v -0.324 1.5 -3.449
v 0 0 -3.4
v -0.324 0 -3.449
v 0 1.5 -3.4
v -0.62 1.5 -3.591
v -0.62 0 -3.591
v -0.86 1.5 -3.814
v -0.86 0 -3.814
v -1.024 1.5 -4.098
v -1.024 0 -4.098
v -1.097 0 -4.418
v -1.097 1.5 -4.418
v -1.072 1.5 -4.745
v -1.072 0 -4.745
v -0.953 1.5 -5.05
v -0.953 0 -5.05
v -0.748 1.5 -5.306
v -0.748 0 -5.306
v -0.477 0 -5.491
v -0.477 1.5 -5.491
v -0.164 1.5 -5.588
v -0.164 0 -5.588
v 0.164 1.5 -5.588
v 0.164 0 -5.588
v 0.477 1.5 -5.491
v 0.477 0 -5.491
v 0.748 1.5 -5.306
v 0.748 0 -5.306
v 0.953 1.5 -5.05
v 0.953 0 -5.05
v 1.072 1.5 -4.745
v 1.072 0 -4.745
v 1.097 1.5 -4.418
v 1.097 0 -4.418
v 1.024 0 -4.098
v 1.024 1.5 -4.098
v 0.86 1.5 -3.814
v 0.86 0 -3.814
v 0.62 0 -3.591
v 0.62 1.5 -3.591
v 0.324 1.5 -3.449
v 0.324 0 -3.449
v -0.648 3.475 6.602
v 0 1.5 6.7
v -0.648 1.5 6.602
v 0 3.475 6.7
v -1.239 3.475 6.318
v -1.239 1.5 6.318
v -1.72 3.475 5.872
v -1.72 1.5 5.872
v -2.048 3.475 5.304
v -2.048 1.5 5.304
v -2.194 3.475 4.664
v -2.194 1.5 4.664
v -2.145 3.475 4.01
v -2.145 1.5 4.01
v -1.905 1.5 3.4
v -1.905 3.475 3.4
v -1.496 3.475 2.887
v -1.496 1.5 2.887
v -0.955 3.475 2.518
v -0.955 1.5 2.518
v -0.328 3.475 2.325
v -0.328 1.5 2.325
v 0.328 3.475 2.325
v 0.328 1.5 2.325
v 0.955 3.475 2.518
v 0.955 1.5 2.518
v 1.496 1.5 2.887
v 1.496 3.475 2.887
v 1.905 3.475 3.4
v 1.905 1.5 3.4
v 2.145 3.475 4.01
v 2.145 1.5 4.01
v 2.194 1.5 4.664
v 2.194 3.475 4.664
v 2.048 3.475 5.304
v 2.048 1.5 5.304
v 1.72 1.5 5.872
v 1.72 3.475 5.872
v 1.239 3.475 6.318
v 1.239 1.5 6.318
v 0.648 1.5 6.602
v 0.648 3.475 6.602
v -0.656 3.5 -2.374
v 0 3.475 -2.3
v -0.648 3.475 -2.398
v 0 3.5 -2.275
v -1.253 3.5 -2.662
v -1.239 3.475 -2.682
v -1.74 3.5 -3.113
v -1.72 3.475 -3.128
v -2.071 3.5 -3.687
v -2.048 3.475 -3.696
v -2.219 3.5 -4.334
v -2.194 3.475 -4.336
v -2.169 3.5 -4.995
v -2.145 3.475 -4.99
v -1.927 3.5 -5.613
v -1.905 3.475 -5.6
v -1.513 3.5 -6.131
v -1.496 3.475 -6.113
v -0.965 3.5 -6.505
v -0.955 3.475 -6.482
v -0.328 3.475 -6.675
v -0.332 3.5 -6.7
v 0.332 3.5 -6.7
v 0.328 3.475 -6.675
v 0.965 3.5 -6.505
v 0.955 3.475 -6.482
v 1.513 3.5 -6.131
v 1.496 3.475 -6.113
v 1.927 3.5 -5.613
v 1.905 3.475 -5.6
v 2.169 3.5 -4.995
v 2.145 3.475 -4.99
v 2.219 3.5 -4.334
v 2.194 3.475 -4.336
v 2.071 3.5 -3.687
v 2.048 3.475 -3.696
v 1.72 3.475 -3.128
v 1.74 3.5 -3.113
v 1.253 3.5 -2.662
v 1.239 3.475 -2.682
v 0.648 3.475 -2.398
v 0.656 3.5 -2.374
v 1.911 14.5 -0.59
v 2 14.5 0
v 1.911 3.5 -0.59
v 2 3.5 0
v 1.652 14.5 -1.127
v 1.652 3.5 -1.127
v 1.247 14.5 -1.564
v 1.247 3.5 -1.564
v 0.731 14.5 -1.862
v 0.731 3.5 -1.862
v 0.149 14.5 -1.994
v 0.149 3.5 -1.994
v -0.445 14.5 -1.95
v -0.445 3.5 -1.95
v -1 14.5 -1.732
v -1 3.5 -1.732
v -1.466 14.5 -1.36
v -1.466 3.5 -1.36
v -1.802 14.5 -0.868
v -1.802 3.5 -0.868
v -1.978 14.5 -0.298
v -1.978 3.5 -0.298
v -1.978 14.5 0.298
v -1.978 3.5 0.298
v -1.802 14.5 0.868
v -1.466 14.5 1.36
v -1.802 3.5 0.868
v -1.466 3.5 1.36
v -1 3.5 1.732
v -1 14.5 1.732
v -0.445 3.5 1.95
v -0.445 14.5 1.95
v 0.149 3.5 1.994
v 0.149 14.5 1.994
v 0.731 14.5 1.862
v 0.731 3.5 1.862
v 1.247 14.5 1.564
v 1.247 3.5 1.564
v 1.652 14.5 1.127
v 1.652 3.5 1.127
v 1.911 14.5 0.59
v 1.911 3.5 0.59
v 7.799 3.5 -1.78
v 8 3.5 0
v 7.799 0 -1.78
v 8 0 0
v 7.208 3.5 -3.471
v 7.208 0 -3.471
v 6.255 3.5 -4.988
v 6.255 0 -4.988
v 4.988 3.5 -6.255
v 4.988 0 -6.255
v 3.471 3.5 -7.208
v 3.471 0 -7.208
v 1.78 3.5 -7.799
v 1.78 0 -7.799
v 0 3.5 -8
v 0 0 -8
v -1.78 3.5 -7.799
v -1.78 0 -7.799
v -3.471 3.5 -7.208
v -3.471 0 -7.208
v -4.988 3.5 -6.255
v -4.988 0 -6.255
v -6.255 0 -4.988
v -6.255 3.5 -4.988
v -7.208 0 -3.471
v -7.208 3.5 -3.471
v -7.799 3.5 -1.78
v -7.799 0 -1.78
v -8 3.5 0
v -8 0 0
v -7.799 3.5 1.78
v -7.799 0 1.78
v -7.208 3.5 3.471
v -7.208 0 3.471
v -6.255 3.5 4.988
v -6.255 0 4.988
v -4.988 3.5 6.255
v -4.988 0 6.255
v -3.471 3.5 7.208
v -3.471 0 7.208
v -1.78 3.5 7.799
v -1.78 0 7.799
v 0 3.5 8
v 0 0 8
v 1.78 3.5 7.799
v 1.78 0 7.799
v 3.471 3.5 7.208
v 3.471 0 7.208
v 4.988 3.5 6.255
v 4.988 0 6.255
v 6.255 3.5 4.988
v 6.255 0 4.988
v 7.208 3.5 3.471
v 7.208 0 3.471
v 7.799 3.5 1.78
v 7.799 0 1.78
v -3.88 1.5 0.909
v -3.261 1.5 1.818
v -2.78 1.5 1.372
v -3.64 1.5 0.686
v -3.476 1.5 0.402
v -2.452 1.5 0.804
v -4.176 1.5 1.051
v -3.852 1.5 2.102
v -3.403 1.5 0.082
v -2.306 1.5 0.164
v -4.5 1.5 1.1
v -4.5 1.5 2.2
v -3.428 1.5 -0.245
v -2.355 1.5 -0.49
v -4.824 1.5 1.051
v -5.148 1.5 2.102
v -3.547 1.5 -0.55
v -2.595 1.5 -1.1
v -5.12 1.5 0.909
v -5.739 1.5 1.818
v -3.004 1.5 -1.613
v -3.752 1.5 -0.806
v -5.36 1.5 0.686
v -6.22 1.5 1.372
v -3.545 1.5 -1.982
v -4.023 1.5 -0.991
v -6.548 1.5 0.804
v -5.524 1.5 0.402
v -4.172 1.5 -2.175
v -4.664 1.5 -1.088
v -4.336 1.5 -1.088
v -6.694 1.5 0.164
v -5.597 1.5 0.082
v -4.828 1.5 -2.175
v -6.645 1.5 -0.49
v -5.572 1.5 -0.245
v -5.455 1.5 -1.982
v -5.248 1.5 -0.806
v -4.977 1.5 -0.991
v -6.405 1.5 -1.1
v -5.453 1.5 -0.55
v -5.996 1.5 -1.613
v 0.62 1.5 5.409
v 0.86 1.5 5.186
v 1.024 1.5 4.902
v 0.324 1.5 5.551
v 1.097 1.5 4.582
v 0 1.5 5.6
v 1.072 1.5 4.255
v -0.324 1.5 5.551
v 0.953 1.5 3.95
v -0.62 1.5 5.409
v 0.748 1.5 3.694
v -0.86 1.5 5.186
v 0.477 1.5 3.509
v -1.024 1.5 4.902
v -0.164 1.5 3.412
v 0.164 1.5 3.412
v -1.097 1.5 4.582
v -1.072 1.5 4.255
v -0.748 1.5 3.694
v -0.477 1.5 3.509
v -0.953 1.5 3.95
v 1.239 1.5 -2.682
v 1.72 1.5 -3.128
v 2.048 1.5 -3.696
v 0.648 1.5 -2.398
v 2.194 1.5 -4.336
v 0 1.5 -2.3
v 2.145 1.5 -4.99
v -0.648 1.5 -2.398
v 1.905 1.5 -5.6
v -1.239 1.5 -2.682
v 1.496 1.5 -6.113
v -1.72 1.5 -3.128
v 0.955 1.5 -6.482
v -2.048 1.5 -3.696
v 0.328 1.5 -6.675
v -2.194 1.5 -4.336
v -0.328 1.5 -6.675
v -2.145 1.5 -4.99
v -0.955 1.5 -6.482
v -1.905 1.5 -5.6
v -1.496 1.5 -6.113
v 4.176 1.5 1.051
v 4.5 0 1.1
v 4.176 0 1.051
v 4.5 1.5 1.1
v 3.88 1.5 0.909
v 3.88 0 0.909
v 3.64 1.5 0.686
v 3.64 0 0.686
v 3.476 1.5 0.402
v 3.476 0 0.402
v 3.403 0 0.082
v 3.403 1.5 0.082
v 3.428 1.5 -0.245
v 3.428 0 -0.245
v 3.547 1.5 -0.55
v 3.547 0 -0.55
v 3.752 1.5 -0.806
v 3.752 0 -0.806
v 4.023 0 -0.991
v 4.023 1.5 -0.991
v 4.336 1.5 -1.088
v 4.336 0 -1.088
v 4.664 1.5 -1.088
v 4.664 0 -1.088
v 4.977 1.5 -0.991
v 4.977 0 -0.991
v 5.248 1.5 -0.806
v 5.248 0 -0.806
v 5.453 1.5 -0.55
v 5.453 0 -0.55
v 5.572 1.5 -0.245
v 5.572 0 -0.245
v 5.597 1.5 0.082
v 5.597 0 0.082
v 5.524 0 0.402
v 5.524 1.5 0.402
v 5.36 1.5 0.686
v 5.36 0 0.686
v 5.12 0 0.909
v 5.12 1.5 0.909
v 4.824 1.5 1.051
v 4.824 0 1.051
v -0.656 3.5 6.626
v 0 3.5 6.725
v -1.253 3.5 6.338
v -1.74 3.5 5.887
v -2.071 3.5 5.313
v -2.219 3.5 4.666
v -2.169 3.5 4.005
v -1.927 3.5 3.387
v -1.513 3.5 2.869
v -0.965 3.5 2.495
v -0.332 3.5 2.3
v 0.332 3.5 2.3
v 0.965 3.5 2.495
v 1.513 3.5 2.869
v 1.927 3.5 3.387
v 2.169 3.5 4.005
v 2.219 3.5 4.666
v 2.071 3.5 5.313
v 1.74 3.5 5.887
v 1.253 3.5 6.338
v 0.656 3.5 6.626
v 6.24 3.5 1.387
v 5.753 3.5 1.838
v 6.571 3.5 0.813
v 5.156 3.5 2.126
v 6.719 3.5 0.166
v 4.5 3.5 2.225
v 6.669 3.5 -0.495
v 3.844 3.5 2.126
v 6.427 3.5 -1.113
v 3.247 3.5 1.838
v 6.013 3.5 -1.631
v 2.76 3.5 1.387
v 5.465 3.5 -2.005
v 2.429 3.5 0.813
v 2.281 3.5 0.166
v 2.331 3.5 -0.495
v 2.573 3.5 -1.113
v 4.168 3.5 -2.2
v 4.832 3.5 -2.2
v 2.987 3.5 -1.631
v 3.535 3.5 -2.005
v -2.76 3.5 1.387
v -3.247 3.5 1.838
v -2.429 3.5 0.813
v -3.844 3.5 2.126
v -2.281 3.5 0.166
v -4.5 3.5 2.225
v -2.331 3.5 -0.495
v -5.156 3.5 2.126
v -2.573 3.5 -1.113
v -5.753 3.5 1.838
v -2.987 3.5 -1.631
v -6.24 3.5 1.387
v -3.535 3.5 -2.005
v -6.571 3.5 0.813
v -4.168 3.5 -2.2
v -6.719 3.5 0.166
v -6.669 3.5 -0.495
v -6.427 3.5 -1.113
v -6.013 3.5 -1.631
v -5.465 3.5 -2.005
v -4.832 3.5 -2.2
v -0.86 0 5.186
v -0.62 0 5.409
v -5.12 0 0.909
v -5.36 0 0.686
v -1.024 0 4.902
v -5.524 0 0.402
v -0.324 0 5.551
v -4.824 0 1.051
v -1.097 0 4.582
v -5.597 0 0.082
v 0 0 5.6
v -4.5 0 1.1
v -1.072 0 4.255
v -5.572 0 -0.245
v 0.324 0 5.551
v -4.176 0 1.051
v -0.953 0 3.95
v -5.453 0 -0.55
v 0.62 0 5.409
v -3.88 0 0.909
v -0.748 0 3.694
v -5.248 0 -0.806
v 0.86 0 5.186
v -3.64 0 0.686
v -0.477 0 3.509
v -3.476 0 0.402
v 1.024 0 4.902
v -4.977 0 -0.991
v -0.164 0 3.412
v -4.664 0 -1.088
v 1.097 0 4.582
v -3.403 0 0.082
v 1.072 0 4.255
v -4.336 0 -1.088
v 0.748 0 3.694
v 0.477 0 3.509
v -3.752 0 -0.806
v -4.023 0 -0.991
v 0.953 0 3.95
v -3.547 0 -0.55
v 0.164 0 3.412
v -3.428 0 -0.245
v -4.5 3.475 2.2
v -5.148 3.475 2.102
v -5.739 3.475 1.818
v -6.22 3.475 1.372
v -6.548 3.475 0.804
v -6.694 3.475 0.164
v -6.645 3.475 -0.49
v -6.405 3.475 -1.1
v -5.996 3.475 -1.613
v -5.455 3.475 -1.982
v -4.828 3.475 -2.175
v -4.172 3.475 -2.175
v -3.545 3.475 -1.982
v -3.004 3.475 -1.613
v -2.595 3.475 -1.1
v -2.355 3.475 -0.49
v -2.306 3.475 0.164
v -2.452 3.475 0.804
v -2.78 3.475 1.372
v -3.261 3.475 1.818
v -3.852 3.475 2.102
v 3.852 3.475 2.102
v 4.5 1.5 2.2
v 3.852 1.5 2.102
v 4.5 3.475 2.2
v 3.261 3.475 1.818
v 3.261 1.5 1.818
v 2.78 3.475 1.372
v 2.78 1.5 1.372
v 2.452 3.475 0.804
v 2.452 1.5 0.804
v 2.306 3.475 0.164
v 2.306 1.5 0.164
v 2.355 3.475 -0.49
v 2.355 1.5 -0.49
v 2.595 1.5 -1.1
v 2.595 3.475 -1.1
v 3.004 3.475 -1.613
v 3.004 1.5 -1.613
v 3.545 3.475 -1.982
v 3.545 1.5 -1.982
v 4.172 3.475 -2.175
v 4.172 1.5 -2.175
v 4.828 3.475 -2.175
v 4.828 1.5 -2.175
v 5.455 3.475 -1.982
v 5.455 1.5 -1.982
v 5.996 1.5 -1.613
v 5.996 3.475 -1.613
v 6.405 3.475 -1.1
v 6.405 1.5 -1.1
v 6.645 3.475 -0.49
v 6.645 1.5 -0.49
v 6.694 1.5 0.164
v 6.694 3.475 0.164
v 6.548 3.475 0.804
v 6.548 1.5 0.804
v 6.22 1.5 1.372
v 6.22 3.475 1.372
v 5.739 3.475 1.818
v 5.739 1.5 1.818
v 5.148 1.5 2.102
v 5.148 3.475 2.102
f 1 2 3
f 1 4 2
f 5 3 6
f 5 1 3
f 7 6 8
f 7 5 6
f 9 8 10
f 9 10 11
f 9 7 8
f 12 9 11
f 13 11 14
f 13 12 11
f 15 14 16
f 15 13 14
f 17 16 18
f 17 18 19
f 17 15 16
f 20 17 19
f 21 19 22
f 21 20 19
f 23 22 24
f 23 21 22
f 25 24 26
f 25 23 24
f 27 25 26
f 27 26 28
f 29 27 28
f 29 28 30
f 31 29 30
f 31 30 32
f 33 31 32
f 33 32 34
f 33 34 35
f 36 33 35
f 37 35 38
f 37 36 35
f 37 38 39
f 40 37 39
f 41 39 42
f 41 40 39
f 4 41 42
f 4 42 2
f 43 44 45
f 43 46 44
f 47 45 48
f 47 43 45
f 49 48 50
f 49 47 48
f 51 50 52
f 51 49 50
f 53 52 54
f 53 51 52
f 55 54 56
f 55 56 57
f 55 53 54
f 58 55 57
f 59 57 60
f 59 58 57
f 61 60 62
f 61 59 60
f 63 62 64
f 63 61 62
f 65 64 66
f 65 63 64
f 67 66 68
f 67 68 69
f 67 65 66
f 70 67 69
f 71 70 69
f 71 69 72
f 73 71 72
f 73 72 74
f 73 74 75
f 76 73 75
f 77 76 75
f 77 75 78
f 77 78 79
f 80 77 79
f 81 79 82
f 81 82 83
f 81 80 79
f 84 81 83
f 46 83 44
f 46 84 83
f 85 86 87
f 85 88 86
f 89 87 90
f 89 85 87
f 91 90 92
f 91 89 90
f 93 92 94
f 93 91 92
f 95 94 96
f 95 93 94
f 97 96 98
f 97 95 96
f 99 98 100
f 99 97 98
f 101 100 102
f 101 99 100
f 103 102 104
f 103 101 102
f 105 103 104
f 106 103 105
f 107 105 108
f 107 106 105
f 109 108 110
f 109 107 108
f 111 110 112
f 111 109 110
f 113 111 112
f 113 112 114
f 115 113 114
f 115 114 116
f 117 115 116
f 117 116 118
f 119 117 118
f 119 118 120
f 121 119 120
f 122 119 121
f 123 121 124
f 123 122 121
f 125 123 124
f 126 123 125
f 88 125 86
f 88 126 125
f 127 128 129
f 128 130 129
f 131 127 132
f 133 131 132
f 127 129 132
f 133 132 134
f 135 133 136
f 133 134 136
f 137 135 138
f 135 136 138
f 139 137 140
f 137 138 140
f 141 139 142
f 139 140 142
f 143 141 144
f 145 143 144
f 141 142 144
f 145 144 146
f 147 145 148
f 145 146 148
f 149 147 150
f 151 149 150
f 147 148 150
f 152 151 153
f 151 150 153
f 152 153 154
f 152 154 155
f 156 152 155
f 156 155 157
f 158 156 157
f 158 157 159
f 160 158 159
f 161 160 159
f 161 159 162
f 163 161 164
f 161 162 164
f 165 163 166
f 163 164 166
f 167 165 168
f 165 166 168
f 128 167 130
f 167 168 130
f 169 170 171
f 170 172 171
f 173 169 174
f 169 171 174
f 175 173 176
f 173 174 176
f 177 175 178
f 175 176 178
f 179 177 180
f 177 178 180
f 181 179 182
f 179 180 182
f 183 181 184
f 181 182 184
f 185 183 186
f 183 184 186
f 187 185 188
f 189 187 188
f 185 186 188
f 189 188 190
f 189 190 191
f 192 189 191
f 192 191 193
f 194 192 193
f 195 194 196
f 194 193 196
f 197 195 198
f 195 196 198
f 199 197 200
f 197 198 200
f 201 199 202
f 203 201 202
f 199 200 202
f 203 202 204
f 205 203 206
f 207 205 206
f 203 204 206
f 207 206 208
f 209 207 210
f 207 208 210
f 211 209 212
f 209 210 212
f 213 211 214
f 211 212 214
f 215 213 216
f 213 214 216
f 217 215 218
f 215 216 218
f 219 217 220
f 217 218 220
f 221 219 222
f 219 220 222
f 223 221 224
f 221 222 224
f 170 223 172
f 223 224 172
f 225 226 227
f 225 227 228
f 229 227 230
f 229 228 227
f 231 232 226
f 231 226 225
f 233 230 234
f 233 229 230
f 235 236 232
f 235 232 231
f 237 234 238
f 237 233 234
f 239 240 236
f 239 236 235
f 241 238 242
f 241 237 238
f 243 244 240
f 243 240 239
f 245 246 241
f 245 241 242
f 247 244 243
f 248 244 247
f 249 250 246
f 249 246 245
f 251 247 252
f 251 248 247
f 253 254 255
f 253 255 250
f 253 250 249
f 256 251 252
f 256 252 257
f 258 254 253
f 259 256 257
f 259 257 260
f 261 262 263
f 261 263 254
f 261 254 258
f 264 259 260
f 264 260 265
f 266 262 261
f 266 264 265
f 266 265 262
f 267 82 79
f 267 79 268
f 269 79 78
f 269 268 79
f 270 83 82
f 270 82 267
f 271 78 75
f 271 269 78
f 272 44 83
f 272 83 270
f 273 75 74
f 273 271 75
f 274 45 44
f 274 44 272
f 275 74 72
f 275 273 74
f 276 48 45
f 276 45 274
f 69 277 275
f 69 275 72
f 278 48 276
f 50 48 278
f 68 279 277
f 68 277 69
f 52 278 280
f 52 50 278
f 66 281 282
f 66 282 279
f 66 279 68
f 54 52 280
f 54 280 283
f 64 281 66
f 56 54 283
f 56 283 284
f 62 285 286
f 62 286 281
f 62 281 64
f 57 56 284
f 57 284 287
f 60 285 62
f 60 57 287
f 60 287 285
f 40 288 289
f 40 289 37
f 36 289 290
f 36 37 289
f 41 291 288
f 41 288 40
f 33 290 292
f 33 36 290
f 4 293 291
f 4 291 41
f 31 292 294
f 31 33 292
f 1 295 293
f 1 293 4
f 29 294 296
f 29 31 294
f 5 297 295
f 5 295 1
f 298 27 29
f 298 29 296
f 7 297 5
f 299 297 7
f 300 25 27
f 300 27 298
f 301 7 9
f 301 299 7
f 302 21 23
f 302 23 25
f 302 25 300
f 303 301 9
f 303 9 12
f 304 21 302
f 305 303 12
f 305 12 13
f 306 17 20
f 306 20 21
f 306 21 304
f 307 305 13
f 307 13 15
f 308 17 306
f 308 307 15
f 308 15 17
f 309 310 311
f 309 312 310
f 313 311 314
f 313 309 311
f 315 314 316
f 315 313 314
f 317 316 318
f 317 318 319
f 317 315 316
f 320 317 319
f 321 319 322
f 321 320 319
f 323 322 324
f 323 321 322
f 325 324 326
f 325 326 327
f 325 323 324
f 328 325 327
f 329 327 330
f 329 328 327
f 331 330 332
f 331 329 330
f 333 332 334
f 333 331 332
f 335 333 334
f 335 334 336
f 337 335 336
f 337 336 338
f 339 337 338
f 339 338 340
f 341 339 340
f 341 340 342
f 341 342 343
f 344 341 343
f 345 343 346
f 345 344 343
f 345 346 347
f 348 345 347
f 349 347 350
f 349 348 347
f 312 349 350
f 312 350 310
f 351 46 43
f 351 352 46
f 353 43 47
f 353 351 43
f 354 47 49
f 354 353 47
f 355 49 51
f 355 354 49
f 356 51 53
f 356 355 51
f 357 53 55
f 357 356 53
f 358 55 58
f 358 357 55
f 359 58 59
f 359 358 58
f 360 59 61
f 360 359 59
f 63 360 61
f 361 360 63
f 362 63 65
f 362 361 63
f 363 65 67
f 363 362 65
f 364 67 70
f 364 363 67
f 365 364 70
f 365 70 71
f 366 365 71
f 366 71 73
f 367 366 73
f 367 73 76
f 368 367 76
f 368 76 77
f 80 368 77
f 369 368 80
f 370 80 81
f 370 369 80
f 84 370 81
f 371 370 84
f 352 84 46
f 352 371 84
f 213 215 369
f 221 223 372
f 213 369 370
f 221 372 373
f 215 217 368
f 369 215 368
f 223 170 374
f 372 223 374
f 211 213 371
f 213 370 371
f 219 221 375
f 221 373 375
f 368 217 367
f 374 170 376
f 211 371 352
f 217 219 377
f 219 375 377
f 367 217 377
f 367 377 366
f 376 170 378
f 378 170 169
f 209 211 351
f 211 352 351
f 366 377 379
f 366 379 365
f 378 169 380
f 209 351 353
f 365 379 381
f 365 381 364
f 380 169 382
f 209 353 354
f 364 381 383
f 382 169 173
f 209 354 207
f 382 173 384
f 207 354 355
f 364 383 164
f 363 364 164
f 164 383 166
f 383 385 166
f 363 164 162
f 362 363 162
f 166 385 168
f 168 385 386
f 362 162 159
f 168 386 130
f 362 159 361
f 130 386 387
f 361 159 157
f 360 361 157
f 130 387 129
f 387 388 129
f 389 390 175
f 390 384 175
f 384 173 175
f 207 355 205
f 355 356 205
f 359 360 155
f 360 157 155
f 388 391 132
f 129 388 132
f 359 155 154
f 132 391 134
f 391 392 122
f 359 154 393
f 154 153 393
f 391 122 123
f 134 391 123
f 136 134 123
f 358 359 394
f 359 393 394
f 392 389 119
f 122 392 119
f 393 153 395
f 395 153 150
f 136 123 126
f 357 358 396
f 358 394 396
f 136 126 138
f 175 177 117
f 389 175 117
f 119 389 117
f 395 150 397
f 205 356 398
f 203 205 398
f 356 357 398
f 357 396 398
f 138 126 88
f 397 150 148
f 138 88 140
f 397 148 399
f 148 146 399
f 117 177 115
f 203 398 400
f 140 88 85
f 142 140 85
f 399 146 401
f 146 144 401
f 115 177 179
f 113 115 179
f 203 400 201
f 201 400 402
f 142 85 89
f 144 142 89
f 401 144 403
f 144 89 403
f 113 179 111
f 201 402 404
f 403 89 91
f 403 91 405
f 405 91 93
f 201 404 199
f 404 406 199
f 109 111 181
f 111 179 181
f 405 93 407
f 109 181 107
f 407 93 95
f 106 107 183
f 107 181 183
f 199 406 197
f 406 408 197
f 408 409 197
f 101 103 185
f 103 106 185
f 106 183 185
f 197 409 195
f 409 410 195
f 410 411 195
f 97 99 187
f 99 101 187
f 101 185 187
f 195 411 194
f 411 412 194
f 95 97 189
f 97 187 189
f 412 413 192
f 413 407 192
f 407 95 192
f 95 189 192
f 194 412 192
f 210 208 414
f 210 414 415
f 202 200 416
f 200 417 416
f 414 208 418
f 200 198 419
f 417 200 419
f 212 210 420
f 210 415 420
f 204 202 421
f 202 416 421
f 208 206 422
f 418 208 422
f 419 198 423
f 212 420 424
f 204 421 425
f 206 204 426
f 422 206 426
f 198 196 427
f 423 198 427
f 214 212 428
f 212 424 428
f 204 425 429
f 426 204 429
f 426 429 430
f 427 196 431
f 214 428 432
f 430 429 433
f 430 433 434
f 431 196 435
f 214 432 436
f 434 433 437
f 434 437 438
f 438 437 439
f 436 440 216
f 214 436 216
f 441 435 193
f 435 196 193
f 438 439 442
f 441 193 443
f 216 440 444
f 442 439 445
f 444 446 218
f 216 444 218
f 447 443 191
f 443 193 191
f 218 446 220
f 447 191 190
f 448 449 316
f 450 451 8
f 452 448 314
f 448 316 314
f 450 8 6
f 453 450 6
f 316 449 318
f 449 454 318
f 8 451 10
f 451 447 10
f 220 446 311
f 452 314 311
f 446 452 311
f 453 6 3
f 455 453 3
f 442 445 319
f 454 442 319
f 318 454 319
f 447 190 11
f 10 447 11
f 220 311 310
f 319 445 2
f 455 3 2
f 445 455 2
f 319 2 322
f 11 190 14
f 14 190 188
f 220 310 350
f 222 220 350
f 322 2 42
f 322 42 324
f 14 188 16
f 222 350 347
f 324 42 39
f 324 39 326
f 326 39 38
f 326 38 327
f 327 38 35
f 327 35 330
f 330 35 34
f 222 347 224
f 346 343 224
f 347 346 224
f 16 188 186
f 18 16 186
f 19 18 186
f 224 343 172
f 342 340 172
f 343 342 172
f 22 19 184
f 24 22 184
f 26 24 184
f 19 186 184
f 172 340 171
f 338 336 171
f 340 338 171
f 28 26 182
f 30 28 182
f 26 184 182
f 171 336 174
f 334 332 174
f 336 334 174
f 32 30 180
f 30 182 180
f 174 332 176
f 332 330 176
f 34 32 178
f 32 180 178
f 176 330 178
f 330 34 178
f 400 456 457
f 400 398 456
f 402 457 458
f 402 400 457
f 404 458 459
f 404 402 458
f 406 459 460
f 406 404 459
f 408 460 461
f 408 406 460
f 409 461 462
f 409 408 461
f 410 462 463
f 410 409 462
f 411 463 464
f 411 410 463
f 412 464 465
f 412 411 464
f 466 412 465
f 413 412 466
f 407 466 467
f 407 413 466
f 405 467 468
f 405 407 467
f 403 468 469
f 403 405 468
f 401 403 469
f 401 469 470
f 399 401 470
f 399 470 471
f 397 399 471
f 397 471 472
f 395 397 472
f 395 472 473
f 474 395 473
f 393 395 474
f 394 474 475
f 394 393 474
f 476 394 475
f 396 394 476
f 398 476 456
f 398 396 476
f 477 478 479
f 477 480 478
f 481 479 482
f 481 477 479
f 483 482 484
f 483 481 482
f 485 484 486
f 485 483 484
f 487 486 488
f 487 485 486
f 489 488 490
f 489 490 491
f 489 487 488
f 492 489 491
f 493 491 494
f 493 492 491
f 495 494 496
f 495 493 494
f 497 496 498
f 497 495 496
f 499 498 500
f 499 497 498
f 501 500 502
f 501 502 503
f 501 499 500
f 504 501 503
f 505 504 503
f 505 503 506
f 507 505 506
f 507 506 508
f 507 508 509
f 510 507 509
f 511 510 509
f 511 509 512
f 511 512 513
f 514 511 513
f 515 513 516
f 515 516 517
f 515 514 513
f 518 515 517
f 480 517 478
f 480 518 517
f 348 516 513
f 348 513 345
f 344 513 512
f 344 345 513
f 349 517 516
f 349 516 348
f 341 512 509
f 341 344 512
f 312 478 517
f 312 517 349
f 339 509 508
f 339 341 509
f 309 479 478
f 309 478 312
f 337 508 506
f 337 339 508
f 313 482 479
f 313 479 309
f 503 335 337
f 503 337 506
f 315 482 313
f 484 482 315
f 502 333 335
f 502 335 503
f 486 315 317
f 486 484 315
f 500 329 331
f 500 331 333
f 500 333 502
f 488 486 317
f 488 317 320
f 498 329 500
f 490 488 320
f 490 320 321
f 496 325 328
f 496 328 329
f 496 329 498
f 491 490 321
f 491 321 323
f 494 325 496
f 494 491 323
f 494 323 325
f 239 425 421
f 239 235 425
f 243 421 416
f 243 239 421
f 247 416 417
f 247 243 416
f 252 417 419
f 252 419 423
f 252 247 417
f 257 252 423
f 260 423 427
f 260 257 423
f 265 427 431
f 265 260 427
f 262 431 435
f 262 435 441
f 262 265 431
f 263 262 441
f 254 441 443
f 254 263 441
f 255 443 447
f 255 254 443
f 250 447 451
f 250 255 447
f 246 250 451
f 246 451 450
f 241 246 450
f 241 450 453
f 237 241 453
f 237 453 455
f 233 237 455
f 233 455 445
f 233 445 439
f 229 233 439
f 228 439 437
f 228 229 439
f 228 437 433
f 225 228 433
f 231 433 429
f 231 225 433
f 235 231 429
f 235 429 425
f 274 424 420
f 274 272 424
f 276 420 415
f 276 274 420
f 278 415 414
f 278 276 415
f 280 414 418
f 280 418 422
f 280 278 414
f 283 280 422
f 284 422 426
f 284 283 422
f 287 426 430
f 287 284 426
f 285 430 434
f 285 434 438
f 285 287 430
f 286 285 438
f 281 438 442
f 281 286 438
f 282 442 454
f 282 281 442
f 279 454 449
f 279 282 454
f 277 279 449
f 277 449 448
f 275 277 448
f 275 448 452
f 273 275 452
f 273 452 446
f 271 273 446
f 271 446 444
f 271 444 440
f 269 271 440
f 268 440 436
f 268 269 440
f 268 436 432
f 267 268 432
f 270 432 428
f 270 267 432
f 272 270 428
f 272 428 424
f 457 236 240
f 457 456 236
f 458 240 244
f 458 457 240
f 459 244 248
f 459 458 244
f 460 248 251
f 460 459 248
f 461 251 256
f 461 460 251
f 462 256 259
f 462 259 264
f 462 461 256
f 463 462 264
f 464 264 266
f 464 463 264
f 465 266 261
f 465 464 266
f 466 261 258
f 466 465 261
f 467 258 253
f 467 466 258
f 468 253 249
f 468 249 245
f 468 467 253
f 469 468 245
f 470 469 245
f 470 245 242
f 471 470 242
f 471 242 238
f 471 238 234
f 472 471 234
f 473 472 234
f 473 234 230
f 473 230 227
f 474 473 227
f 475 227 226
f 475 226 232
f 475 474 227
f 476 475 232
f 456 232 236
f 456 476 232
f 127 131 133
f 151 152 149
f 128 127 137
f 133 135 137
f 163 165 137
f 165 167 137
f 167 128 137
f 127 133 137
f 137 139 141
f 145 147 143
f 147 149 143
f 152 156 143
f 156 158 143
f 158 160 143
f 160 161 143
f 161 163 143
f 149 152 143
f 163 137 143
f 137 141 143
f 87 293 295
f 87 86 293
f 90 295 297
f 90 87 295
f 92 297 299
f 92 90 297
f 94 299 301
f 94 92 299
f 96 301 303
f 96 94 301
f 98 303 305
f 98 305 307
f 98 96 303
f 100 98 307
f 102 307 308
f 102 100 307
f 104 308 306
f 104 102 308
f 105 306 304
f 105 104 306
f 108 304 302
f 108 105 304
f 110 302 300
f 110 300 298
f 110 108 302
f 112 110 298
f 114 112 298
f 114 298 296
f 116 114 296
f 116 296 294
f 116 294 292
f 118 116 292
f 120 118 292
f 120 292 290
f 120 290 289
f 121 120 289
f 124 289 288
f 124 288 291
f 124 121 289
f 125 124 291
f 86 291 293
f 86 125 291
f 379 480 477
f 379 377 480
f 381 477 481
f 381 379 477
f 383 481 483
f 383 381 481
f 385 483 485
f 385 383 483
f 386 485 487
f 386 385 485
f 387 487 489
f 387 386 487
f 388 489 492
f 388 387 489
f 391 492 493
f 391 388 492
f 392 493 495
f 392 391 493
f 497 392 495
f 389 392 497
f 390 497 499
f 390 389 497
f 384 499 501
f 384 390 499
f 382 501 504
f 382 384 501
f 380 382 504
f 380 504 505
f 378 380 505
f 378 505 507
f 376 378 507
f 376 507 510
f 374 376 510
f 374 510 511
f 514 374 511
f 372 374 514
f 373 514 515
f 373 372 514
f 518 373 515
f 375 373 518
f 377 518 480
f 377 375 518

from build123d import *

# Parameters (mm, degrees)
CBORE_FOR_M2_SHCS1_AT_2_COUNT = 2
CBORE_FOR_M2_SHCS1_AT_2_PITCH = 6.363961031
CBORE_FOR_M2_SHCS1_AT_3_COUNT = 2
CBORE_FOR_M2_SHCS1_AT_3_PITCH = 9
CBORE_FOR_M2_SHCS1_AT_4_COUNT = 2
CBORE_FOR_M2_SHCS1_AT_4_PITCH = 6.363961031


with BuildPart() as part:
    # Sketch1 → Revolve1 (revolve)
    with BuildSketch(Plane.XY):
        Polygon((0, 0), (0, 14.5), (2, 14.5), (2, 3.5), (8, 3.5), (8, 0), align=None)
    revolve(axis=Axis((0, 0, 0), (0, 1, 0)))

    # Sketch5 → CBORE for M2 SHCS1 (revolve, cut)
    with BuildSketch(Plane(origin=(0, 3.5, -4.5), x_dir=(0, 0, 1), z_dir=(1, 0, 0))):
        Polygon((0, 0), (0, 3.5), (1.1, 3.5), (1.1, 2), (2.2, 2), (2.2, 0.025), (2.225, 0), align=None)
    cbore_for_m2_shcs1 = revolve(axis=Axis((0, 9.85, -4.5), (0, -1, 0)), mode=Mode.SUBTRACT)

    # CBORE for M2 SHCS1 at 2: CBORE for M2 SHCS1 ×2
    with Locations(*[Vector(0.707106781, 0, 0.707106781) * (i * CBORE_FOR_M2_SHCS1_AT_2_PITCH) for i in range(1, CBORE_FOR_M2_SHCS1_AT_2_COUNT)]):
        add(cbore_for_m2_shcs1, mode=Mode.SUBTRACT)

    # CBORE for M2 SHCS1 at 3: CBORE for M2 SHCS1 ×2
    with Locations(*[(0, 0, i * CBORE_FOR_M2_SHCS1_AT_3_PITCH) for i in range(1, CBORE_FOR_M2_SHCS1_AT_3_COUNT)]):
        add(cbore_for_m2_shcs1, mode=Mode.SUBTRACT)

    # CBORE for M2 SHCS1 at 4: CBORE for M2 SHCS1 ×2
    with Locations(*[Vector(-0.707106781, 0, 0.707106781) * (i * CBORE_FOR_M2_SHCS1_AT_4_PITCH) for i in range(1, CBORE_FOR_M2_SHCS1_AT_4_COUNT)]):
        add(cbore_for_m2_shcs1, mode=Mode.SUBTRACT)


solid = part.part
